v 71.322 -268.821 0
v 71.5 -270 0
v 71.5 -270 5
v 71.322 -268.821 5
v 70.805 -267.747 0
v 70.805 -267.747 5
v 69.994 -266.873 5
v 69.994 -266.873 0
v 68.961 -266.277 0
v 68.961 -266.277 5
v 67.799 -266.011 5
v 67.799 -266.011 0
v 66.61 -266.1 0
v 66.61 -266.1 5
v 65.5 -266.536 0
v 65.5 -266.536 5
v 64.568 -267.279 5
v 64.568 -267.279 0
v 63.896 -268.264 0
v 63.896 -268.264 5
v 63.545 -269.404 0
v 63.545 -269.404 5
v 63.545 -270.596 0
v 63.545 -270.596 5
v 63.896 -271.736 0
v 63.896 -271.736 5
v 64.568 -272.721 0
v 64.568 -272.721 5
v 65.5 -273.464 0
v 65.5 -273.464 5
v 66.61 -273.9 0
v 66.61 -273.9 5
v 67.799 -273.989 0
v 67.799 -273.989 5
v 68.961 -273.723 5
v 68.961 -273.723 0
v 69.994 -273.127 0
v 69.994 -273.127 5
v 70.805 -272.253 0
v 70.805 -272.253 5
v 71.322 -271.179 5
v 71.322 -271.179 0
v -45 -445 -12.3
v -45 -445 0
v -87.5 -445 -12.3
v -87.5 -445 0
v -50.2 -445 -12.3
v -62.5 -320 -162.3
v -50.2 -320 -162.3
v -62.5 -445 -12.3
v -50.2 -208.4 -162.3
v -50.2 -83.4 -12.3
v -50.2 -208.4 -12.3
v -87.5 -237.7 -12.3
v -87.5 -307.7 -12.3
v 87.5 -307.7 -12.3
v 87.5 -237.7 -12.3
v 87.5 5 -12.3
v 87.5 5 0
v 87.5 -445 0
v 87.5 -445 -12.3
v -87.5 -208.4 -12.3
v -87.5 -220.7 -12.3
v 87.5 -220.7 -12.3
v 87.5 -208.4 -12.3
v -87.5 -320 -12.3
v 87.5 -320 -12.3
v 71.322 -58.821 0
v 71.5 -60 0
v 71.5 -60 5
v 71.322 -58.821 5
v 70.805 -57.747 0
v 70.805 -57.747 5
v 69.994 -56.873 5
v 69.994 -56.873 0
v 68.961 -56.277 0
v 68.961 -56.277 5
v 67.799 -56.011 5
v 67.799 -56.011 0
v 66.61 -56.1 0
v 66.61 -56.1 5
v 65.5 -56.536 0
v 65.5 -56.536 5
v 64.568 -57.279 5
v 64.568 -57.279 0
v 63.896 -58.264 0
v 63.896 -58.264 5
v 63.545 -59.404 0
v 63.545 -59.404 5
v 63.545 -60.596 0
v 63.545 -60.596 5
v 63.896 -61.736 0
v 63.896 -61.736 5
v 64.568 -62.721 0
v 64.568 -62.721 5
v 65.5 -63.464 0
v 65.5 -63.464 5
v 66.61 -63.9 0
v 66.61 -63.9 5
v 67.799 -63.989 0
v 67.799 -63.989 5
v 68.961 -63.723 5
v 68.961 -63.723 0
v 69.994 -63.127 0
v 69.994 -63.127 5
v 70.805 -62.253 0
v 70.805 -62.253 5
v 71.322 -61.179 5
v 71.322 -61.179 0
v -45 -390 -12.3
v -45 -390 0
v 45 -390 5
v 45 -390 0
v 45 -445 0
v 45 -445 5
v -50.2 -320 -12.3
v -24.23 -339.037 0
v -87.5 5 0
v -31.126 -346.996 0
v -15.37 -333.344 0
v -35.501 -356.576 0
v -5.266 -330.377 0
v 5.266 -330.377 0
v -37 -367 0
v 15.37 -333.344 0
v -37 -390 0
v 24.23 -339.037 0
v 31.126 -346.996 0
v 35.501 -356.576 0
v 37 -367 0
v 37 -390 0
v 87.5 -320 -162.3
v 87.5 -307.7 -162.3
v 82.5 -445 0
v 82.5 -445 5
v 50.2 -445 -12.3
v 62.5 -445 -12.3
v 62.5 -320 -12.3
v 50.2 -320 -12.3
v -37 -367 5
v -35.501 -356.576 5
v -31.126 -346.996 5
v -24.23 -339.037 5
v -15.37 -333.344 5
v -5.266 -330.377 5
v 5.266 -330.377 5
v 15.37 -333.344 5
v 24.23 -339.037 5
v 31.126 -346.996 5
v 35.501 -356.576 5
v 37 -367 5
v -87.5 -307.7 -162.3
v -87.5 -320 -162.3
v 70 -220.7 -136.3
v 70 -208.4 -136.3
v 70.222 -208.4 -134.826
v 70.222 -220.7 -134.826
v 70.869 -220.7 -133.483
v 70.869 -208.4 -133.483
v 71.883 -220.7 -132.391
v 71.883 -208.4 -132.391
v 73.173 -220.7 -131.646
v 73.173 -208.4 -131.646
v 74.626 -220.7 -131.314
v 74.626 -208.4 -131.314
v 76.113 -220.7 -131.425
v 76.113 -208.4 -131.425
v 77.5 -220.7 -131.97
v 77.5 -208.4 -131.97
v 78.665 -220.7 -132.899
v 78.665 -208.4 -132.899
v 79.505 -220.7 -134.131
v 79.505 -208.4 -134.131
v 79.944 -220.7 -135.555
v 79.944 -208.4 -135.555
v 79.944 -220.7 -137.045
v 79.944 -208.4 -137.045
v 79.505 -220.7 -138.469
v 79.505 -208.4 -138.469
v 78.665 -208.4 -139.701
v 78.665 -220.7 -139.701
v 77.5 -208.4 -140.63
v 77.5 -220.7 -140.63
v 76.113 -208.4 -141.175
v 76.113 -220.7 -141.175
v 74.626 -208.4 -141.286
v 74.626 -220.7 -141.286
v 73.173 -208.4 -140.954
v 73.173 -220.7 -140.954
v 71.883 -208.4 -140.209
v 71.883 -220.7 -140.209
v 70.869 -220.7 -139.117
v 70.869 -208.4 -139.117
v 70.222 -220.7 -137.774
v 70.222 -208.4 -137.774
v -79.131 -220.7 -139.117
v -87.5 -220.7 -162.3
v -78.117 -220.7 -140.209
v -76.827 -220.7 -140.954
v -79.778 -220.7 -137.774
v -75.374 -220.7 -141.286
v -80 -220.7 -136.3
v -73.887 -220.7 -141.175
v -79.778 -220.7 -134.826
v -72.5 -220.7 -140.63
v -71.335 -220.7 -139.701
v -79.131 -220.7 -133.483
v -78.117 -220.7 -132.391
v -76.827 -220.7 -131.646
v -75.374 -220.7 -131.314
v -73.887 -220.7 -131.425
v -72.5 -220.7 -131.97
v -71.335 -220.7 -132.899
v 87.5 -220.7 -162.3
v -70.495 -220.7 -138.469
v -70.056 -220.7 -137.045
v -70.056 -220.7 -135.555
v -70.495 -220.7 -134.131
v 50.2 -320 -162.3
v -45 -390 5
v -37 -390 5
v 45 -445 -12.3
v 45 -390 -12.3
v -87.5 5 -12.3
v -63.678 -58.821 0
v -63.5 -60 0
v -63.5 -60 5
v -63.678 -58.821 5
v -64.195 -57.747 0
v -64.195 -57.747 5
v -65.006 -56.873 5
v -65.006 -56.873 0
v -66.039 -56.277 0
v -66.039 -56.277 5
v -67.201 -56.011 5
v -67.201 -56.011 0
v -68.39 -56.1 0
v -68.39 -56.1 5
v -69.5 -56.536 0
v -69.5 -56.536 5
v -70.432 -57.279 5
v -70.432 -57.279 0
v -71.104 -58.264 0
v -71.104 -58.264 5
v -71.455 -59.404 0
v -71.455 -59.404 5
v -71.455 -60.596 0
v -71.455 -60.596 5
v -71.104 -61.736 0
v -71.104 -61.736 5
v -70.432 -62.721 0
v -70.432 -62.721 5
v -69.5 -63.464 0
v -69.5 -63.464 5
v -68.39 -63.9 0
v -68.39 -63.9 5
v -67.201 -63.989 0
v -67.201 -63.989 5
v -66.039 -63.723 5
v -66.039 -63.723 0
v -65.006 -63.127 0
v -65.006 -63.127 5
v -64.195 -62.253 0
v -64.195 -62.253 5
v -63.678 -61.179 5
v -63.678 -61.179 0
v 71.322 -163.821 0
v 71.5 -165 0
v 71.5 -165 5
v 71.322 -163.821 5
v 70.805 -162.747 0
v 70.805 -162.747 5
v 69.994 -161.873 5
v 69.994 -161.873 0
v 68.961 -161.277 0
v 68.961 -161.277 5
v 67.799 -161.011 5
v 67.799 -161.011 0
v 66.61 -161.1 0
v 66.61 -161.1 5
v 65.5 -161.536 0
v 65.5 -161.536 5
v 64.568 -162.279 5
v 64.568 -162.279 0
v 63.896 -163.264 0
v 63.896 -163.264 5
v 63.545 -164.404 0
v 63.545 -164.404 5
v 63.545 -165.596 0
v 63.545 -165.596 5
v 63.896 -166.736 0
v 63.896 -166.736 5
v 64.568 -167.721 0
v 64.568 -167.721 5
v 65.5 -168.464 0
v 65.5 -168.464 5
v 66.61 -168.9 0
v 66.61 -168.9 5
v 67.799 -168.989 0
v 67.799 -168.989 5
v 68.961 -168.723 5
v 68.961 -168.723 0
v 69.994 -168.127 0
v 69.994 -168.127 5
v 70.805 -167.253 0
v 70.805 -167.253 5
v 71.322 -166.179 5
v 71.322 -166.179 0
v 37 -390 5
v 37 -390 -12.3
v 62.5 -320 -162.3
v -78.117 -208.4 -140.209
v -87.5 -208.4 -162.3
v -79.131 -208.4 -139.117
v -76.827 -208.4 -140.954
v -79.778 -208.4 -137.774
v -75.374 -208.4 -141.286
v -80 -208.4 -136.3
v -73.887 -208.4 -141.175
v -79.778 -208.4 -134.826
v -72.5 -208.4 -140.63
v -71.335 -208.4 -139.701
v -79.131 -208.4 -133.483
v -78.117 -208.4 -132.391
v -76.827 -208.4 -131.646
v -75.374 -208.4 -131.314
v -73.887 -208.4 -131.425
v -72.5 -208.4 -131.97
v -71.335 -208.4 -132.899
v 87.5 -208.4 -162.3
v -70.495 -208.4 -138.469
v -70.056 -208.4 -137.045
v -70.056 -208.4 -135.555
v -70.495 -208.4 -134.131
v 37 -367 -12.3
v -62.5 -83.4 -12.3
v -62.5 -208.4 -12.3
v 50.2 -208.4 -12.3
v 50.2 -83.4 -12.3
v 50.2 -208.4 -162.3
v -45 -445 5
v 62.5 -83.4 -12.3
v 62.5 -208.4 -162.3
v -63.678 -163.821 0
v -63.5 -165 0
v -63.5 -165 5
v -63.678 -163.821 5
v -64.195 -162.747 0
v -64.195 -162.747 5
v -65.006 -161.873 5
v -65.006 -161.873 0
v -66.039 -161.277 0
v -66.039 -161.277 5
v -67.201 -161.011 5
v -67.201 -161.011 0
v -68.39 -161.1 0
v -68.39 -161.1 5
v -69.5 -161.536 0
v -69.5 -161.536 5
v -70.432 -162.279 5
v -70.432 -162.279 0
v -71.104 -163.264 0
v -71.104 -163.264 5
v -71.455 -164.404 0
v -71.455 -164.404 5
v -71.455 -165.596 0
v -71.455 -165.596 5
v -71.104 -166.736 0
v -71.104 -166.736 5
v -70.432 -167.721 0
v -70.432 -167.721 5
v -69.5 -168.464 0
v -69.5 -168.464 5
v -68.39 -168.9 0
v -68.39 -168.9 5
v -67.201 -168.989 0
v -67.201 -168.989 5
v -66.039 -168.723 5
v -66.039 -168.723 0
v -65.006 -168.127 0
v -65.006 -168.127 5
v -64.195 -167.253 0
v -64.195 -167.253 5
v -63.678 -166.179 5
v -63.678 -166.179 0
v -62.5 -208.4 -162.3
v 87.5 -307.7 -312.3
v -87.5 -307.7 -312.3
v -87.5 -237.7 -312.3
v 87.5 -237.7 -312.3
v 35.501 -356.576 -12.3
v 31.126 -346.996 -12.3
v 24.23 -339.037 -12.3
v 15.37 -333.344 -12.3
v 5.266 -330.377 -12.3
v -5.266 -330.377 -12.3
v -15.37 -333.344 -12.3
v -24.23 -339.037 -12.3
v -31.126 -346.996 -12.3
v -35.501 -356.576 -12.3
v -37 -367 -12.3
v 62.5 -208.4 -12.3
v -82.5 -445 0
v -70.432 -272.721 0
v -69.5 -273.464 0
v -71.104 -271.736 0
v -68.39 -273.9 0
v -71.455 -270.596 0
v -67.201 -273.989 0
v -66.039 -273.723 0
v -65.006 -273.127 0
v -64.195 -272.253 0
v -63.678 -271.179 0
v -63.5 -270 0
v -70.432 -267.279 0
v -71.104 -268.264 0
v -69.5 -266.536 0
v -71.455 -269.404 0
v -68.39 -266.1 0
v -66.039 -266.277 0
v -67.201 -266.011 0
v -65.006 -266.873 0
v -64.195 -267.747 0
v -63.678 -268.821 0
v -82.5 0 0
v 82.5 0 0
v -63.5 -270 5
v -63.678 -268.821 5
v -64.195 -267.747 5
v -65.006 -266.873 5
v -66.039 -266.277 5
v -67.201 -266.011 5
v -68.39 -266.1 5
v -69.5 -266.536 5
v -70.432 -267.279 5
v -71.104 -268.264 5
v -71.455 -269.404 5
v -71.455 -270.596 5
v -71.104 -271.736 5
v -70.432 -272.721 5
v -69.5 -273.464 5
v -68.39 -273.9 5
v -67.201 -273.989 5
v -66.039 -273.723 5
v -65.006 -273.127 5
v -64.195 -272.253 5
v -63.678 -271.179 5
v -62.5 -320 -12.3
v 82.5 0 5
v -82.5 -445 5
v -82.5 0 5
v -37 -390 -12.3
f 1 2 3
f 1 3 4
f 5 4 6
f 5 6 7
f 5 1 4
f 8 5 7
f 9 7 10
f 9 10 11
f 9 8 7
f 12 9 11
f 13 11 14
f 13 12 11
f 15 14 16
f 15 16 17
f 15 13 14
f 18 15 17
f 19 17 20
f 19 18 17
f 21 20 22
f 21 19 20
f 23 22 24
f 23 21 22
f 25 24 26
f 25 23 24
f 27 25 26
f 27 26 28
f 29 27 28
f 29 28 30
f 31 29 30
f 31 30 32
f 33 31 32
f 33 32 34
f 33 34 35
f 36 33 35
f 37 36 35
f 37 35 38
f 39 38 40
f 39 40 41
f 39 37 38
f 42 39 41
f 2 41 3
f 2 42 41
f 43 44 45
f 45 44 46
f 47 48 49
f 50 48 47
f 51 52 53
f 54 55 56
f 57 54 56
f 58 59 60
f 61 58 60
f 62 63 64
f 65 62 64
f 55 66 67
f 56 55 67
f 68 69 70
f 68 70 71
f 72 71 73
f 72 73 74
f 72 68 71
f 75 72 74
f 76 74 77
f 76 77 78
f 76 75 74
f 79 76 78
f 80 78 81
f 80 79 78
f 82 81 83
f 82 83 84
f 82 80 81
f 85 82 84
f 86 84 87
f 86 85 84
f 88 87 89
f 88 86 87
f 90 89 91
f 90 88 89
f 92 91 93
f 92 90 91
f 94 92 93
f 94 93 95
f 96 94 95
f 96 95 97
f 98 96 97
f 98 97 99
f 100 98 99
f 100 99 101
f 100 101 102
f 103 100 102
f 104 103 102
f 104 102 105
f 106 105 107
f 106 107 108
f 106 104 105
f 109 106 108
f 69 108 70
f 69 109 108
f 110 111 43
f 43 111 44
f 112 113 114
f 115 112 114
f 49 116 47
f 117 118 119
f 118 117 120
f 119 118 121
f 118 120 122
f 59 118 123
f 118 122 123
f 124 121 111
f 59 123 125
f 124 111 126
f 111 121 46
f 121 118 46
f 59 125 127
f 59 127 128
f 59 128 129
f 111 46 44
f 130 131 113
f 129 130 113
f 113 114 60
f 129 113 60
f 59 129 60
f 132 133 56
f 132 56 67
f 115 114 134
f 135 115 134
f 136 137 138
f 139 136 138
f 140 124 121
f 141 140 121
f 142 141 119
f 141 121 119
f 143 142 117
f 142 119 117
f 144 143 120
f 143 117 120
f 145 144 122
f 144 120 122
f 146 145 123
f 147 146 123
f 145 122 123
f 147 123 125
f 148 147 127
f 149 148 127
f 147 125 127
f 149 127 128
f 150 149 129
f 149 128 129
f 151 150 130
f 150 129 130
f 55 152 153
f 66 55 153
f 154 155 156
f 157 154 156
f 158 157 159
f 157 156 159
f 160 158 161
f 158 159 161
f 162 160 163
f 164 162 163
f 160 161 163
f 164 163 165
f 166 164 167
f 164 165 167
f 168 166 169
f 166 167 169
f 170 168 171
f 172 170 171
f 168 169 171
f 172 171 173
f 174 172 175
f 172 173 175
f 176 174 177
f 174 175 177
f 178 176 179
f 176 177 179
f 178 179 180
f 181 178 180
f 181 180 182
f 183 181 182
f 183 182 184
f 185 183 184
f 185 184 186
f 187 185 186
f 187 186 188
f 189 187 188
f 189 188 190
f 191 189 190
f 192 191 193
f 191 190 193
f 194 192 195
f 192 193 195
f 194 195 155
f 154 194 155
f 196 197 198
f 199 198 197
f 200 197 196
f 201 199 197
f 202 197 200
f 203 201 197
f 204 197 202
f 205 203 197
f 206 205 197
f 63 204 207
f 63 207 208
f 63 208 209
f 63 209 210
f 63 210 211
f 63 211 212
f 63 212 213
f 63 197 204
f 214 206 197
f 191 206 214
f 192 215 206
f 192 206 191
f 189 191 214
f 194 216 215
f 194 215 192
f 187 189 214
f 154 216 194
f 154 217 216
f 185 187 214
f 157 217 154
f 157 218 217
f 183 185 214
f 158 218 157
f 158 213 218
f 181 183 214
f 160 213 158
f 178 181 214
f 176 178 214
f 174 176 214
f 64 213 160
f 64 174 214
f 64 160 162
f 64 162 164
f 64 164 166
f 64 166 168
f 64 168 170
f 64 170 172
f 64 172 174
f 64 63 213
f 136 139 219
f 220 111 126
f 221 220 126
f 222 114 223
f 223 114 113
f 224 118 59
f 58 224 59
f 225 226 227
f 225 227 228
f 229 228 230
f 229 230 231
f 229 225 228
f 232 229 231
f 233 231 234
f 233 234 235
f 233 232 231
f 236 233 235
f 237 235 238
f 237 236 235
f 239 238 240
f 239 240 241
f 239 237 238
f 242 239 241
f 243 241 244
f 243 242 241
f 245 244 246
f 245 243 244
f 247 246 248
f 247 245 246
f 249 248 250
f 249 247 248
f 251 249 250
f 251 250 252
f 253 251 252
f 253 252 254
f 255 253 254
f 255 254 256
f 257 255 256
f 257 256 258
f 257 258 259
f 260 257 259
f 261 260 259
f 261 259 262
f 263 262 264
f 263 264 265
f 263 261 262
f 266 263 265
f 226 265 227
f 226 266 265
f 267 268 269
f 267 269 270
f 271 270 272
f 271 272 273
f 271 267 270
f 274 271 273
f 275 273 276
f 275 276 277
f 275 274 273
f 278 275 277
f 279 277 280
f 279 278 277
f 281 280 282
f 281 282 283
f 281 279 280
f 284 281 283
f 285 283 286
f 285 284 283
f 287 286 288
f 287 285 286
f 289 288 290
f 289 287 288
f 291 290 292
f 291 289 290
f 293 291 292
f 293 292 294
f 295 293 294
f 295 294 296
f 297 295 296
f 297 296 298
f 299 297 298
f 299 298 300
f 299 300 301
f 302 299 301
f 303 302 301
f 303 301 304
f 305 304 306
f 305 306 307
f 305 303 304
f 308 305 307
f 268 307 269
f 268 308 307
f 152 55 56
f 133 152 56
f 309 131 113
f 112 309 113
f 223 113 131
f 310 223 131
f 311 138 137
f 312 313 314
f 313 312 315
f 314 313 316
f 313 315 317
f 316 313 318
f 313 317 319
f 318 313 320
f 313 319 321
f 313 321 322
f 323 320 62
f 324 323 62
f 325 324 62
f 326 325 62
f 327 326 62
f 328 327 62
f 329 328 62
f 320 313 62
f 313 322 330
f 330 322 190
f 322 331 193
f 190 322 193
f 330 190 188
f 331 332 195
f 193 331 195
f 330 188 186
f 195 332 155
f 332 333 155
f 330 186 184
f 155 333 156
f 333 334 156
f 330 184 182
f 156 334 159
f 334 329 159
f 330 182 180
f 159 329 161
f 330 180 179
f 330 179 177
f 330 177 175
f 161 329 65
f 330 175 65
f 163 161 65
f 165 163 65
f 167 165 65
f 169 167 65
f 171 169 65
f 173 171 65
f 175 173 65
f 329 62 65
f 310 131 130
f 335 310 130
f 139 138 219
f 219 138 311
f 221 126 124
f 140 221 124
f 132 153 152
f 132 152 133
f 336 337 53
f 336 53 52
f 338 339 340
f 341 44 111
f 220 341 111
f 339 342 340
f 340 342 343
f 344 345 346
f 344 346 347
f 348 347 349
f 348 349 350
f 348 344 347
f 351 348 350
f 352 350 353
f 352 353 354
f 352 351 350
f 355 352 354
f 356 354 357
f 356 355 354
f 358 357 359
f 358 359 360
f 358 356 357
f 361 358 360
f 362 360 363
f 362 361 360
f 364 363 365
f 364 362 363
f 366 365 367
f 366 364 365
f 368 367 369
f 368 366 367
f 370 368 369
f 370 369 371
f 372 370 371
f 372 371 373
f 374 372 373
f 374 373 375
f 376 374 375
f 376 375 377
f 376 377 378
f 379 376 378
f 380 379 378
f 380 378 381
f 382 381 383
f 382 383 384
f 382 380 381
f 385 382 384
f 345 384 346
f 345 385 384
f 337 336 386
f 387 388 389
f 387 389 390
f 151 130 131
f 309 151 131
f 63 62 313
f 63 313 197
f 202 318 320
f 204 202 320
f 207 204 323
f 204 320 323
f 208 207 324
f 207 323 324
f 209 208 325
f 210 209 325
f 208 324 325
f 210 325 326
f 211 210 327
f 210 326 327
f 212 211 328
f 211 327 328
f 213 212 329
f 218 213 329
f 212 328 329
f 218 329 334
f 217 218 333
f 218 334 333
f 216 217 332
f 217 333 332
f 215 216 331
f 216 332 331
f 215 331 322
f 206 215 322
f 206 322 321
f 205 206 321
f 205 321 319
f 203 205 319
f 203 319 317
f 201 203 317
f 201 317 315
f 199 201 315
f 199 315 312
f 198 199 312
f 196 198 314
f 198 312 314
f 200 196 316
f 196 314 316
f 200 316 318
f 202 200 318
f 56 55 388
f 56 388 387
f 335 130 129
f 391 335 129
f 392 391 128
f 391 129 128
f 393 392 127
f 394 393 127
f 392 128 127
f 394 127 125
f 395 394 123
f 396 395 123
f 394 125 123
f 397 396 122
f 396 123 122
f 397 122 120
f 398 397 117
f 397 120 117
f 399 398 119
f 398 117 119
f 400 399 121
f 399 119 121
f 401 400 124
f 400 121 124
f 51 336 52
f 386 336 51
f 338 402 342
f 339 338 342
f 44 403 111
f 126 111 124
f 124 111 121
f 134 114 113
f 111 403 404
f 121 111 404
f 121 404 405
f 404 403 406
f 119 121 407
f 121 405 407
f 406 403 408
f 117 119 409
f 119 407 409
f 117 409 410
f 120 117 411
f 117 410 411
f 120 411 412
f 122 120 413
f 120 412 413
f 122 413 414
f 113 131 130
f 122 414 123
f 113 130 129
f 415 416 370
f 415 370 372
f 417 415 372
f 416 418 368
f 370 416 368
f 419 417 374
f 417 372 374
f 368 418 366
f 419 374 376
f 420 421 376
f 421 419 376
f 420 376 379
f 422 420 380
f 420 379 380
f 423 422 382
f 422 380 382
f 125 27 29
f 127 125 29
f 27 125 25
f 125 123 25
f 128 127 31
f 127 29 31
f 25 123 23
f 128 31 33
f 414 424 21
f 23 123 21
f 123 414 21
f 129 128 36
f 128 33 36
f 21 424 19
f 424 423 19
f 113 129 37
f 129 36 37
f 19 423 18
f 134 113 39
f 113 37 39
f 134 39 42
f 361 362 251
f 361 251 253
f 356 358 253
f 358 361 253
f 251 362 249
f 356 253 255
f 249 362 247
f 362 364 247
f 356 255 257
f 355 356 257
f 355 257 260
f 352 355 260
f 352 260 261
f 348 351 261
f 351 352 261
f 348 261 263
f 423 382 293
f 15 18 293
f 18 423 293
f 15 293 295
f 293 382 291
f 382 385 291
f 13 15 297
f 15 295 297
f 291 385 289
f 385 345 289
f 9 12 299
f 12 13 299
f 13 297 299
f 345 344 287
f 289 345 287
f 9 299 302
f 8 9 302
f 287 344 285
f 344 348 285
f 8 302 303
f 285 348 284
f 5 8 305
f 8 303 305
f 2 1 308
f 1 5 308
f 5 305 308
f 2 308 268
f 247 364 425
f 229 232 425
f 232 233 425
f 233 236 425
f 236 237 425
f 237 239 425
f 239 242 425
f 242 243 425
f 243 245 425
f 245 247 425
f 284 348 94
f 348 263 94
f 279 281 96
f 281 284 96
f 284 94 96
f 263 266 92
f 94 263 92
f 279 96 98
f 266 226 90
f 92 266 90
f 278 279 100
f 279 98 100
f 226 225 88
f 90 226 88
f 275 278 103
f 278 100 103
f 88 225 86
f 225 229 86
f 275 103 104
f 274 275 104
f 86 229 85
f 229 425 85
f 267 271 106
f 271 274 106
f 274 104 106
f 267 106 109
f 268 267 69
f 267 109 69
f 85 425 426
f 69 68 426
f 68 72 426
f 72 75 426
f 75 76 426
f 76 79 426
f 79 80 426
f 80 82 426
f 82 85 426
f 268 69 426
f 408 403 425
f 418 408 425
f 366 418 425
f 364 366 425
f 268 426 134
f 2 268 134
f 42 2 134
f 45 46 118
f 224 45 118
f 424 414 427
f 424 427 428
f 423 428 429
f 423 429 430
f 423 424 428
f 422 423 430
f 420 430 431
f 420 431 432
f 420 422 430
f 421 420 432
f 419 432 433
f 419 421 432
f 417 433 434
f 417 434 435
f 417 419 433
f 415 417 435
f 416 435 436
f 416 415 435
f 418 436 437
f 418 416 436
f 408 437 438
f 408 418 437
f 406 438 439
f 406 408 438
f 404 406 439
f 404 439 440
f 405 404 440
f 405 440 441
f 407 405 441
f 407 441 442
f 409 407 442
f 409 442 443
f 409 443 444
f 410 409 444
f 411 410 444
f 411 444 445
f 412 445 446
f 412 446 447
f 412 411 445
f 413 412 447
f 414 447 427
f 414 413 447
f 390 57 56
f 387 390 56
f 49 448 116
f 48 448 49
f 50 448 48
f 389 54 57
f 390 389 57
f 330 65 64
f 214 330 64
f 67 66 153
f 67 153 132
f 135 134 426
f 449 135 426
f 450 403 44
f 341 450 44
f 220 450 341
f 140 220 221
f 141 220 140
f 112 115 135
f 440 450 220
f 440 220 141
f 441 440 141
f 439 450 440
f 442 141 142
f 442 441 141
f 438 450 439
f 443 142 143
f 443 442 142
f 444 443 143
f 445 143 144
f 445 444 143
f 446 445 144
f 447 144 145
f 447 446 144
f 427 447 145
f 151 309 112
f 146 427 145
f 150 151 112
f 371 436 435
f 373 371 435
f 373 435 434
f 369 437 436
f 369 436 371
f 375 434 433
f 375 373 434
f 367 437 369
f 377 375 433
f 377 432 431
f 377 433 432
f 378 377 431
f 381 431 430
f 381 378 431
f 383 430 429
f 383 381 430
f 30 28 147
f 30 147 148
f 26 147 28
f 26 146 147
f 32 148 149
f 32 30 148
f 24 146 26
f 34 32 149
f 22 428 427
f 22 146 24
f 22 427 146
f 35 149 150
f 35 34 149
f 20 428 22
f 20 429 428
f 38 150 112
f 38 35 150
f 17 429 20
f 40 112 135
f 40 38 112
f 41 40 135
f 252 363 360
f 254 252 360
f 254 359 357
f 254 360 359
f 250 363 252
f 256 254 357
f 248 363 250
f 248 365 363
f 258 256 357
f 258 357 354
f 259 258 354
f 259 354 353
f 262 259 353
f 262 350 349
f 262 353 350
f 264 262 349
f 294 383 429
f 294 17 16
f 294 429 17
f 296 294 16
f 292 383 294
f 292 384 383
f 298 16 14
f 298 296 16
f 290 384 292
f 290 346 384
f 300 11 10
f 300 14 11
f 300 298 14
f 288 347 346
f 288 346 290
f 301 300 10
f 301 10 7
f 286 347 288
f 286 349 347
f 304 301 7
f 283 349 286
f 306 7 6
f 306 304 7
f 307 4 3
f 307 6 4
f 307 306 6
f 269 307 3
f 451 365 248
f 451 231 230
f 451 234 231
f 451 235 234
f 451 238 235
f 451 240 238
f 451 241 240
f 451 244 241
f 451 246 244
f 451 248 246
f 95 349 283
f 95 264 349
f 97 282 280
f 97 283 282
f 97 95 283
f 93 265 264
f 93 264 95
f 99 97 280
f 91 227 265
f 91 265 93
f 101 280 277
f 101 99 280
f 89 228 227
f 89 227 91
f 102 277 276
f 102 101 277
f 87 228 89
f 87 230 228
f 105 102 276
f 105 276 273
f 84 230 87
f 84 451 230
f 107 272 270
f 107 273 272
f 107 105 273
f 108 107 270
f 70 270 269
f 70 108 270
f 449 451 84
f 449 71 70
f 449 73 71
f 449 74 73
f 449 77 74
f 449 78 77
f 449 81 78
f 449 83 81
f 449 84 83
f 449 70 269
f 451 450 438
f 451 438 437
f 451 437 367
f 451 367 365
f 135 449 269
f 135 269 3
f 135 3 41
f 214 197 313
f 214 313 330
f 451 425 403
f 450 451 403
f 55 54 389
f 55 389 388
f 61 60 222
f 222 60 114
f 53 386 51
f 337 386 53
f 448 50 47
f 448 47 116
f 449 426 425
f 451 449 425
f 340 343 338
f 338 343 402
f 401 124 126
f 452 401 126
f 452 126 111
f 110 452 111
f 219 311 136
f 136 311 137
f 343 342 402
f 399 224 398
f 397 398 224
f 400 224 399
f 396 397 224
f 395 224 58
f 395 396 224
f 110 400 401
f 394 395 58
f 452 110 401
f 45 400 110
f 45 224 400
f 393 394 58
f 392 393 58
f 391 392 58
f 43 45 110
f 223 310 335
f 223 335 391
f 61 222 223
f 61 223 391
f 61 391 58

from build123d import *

# Parameters (mm, degrees)
F1_R      = 4
F2_DEPTH  = 5
F4_DEPTH  = 12.3
F5_W      = 175
F5_H      = 70
F6_DEPTH  = 300
F7_W      = 175
F7_H      = 12.3
F8_DEPTH  = 150
F11_DEPTH = 12.3
F15_R     = 5
F16_DEPTH = 12.3


# Not quite as in the source:
# - a feature of the source that left no trace in its solid (it failed there, or was rolled back) is left out


with BuildPart() as f2:
    # F1 (on Top) → F2 (new body)
    with BuildSketch(Plane.XY):
        with BuildLine():
            Line((82.5, 0), (-82.5, 0))
            Line((-82.5, 0), (-82.5, -445))
            Line((-82.5, -445), (-45, -445))
            Line((-45, -445), (-45, -390))
            Line((-45, -390), (-37, -390))
            Line((-37, -390), (-37, -367))
            ThreePointArc((-37, -367), (0, -330), (37, -367))
            Line((37, -367), (37, -390))
            Line((37, -390), (45, -390))
            Line((45, -390), (45, -445))
            Line((45, -445), (82.5, -445))
            Line((82.5, -445), (82.5, 0))
        make_face()
        with Locations((-67.5, -270)):
            Circle(F1_R, mode=Mode.SUBTRACT)
        with Locations((67.5, -270)):
            Circle(F1_R, mode=Mode.SUBTRACT)
        with Locations((-67.5, -165)):
            Circle(F1_R, mode=Mode.SUBTRACT)
        with Locations((-67.5, -60)):
            Circle(F1_R, mode=Mode.SUBTRACT)
        with Locations((67.5, -165)):
            Circle(F1_R, mode=Mode.SUBTRACT)
        with Locations((67.5, -60)):
            Circle(F1_R, mode=Mode.SUBTRACT)
    extrude(amount=F2_DEPTH)


with BuildPart() as f4:
    # F3 (on face) → F4 (new body)
    with BuildSketch(Plane(origin=(0, 0, 0), x_dir=(1, 0, 0), z_dir=(0, 0, -1))):
        with BuildLine():
            Line((-87.5, 445), (-87.5, -5))
            Line((-87.5, -5), (87.5, -5))
            Line((87.5, -5), (87.5, 445))
            Line((87.5, 445), (45, 445))
            Line((45, 445), (45, 390))
            Line((45, 390), (37, 390))
            Line((37, 390), (37, 367))
            ThreePointArc((37, 367), (0, 330), (-37, 367))
            Line((-37, 367), (-37, 390))
            Line((-37, 390), (-45, 390))
            Line((-45, 390), (-45, 445))
            Line((-45, 445), (-87.5, 445))
        make_face()
    extrude(amount=F4_DEPTH)


with BuildPart() as f6:
    # F5 (on face) → F6 (new body)
    with BuildSketch(Plane(origin=(0, 0, -12.3), x_dir=(1, 0, 0), z_dir=(0, 0, -1))):
        with Locations((0, 272.7)):
            Rectangle(F5_W, F5_H)
    extrude(amount=F6_DEPTH)


with BuildPart() as f8:
    # F7 (on face) → F8 (new body)
    with BuildSketch(Plane(origin=(0, 0, -12.3), x_dir=(1, 0, 0), z_dir=(0, 0, -1))):
        with Locations((0, 313.85)):
            Rectangle(F7_W, F7_H)
    extrude(amount=F8_DEPTH)


with BuildPart() as f8b:
    # F7 (on face) → F8, piece 2 (new body)
    with BuildSketch(Plane(origin=(0, 0, -12.3), x_dir=(1, 0, 0), z_dir=(0, 0, -1))):
        with Locations((0, 214.55)):
            Rectangle(F7_W, F7_H)
    extrude(amount=F8_DEPTH)

    # F15 (on face) → F16 (cut, through all)
    with BuildSketch(Plane(origin=(0, -208.4, 0), x_dir=(-1, 0, 0), z_dir=(0, 1, 0))):
        with Locations((75, -136.3)):
            Circle(F15_R)
        with Locations((-75, -136.3)):
            Circle(F15_R)
    extrude(amount=-F16_DEPTH, mode=Mode.SUBTRACT)


with BuildPart() as f11:
    # F10 (on offset) → F11 (new body)
    with BuildSketch(Plane(origin=(-62.5, 0, 0), x_dir=(0, -1, 0), z_dir=(-1, 0, 0))):
        Polygon((320, -162.3), (445, -12.3), (320, -12.3), align=None)
    extrude(amount=-F11_DEPTH)


with BuildPart() as f11b:
    # F10 (on offset) → F11, piece 2 (new body)
    with BuildSketch(Plane(origin=(-62.5, 0, 0), x_dir=(0, -1, 0), z_dir=(-1, 0, 0))):
        Polygon((83.4, -12.3), (208.4, -162.3), (208.4, -12.3), align=None)
    extrude(amount=-F11_DEPTH)


with BuildPart() as f12_1:
    # F12: instance of F11b
    add(f11b.part.mirror(Plane.YZ))


with BuildPart() as f12_2:
    # F12: instance of F11
    add(f11.part.mirror(Plane.YZ))


solid = Compound([f2.part, f4.part, f6.part, f8.part, f8b.part, f11.part, f11b.part, f12_1.part, f12_2.part])
